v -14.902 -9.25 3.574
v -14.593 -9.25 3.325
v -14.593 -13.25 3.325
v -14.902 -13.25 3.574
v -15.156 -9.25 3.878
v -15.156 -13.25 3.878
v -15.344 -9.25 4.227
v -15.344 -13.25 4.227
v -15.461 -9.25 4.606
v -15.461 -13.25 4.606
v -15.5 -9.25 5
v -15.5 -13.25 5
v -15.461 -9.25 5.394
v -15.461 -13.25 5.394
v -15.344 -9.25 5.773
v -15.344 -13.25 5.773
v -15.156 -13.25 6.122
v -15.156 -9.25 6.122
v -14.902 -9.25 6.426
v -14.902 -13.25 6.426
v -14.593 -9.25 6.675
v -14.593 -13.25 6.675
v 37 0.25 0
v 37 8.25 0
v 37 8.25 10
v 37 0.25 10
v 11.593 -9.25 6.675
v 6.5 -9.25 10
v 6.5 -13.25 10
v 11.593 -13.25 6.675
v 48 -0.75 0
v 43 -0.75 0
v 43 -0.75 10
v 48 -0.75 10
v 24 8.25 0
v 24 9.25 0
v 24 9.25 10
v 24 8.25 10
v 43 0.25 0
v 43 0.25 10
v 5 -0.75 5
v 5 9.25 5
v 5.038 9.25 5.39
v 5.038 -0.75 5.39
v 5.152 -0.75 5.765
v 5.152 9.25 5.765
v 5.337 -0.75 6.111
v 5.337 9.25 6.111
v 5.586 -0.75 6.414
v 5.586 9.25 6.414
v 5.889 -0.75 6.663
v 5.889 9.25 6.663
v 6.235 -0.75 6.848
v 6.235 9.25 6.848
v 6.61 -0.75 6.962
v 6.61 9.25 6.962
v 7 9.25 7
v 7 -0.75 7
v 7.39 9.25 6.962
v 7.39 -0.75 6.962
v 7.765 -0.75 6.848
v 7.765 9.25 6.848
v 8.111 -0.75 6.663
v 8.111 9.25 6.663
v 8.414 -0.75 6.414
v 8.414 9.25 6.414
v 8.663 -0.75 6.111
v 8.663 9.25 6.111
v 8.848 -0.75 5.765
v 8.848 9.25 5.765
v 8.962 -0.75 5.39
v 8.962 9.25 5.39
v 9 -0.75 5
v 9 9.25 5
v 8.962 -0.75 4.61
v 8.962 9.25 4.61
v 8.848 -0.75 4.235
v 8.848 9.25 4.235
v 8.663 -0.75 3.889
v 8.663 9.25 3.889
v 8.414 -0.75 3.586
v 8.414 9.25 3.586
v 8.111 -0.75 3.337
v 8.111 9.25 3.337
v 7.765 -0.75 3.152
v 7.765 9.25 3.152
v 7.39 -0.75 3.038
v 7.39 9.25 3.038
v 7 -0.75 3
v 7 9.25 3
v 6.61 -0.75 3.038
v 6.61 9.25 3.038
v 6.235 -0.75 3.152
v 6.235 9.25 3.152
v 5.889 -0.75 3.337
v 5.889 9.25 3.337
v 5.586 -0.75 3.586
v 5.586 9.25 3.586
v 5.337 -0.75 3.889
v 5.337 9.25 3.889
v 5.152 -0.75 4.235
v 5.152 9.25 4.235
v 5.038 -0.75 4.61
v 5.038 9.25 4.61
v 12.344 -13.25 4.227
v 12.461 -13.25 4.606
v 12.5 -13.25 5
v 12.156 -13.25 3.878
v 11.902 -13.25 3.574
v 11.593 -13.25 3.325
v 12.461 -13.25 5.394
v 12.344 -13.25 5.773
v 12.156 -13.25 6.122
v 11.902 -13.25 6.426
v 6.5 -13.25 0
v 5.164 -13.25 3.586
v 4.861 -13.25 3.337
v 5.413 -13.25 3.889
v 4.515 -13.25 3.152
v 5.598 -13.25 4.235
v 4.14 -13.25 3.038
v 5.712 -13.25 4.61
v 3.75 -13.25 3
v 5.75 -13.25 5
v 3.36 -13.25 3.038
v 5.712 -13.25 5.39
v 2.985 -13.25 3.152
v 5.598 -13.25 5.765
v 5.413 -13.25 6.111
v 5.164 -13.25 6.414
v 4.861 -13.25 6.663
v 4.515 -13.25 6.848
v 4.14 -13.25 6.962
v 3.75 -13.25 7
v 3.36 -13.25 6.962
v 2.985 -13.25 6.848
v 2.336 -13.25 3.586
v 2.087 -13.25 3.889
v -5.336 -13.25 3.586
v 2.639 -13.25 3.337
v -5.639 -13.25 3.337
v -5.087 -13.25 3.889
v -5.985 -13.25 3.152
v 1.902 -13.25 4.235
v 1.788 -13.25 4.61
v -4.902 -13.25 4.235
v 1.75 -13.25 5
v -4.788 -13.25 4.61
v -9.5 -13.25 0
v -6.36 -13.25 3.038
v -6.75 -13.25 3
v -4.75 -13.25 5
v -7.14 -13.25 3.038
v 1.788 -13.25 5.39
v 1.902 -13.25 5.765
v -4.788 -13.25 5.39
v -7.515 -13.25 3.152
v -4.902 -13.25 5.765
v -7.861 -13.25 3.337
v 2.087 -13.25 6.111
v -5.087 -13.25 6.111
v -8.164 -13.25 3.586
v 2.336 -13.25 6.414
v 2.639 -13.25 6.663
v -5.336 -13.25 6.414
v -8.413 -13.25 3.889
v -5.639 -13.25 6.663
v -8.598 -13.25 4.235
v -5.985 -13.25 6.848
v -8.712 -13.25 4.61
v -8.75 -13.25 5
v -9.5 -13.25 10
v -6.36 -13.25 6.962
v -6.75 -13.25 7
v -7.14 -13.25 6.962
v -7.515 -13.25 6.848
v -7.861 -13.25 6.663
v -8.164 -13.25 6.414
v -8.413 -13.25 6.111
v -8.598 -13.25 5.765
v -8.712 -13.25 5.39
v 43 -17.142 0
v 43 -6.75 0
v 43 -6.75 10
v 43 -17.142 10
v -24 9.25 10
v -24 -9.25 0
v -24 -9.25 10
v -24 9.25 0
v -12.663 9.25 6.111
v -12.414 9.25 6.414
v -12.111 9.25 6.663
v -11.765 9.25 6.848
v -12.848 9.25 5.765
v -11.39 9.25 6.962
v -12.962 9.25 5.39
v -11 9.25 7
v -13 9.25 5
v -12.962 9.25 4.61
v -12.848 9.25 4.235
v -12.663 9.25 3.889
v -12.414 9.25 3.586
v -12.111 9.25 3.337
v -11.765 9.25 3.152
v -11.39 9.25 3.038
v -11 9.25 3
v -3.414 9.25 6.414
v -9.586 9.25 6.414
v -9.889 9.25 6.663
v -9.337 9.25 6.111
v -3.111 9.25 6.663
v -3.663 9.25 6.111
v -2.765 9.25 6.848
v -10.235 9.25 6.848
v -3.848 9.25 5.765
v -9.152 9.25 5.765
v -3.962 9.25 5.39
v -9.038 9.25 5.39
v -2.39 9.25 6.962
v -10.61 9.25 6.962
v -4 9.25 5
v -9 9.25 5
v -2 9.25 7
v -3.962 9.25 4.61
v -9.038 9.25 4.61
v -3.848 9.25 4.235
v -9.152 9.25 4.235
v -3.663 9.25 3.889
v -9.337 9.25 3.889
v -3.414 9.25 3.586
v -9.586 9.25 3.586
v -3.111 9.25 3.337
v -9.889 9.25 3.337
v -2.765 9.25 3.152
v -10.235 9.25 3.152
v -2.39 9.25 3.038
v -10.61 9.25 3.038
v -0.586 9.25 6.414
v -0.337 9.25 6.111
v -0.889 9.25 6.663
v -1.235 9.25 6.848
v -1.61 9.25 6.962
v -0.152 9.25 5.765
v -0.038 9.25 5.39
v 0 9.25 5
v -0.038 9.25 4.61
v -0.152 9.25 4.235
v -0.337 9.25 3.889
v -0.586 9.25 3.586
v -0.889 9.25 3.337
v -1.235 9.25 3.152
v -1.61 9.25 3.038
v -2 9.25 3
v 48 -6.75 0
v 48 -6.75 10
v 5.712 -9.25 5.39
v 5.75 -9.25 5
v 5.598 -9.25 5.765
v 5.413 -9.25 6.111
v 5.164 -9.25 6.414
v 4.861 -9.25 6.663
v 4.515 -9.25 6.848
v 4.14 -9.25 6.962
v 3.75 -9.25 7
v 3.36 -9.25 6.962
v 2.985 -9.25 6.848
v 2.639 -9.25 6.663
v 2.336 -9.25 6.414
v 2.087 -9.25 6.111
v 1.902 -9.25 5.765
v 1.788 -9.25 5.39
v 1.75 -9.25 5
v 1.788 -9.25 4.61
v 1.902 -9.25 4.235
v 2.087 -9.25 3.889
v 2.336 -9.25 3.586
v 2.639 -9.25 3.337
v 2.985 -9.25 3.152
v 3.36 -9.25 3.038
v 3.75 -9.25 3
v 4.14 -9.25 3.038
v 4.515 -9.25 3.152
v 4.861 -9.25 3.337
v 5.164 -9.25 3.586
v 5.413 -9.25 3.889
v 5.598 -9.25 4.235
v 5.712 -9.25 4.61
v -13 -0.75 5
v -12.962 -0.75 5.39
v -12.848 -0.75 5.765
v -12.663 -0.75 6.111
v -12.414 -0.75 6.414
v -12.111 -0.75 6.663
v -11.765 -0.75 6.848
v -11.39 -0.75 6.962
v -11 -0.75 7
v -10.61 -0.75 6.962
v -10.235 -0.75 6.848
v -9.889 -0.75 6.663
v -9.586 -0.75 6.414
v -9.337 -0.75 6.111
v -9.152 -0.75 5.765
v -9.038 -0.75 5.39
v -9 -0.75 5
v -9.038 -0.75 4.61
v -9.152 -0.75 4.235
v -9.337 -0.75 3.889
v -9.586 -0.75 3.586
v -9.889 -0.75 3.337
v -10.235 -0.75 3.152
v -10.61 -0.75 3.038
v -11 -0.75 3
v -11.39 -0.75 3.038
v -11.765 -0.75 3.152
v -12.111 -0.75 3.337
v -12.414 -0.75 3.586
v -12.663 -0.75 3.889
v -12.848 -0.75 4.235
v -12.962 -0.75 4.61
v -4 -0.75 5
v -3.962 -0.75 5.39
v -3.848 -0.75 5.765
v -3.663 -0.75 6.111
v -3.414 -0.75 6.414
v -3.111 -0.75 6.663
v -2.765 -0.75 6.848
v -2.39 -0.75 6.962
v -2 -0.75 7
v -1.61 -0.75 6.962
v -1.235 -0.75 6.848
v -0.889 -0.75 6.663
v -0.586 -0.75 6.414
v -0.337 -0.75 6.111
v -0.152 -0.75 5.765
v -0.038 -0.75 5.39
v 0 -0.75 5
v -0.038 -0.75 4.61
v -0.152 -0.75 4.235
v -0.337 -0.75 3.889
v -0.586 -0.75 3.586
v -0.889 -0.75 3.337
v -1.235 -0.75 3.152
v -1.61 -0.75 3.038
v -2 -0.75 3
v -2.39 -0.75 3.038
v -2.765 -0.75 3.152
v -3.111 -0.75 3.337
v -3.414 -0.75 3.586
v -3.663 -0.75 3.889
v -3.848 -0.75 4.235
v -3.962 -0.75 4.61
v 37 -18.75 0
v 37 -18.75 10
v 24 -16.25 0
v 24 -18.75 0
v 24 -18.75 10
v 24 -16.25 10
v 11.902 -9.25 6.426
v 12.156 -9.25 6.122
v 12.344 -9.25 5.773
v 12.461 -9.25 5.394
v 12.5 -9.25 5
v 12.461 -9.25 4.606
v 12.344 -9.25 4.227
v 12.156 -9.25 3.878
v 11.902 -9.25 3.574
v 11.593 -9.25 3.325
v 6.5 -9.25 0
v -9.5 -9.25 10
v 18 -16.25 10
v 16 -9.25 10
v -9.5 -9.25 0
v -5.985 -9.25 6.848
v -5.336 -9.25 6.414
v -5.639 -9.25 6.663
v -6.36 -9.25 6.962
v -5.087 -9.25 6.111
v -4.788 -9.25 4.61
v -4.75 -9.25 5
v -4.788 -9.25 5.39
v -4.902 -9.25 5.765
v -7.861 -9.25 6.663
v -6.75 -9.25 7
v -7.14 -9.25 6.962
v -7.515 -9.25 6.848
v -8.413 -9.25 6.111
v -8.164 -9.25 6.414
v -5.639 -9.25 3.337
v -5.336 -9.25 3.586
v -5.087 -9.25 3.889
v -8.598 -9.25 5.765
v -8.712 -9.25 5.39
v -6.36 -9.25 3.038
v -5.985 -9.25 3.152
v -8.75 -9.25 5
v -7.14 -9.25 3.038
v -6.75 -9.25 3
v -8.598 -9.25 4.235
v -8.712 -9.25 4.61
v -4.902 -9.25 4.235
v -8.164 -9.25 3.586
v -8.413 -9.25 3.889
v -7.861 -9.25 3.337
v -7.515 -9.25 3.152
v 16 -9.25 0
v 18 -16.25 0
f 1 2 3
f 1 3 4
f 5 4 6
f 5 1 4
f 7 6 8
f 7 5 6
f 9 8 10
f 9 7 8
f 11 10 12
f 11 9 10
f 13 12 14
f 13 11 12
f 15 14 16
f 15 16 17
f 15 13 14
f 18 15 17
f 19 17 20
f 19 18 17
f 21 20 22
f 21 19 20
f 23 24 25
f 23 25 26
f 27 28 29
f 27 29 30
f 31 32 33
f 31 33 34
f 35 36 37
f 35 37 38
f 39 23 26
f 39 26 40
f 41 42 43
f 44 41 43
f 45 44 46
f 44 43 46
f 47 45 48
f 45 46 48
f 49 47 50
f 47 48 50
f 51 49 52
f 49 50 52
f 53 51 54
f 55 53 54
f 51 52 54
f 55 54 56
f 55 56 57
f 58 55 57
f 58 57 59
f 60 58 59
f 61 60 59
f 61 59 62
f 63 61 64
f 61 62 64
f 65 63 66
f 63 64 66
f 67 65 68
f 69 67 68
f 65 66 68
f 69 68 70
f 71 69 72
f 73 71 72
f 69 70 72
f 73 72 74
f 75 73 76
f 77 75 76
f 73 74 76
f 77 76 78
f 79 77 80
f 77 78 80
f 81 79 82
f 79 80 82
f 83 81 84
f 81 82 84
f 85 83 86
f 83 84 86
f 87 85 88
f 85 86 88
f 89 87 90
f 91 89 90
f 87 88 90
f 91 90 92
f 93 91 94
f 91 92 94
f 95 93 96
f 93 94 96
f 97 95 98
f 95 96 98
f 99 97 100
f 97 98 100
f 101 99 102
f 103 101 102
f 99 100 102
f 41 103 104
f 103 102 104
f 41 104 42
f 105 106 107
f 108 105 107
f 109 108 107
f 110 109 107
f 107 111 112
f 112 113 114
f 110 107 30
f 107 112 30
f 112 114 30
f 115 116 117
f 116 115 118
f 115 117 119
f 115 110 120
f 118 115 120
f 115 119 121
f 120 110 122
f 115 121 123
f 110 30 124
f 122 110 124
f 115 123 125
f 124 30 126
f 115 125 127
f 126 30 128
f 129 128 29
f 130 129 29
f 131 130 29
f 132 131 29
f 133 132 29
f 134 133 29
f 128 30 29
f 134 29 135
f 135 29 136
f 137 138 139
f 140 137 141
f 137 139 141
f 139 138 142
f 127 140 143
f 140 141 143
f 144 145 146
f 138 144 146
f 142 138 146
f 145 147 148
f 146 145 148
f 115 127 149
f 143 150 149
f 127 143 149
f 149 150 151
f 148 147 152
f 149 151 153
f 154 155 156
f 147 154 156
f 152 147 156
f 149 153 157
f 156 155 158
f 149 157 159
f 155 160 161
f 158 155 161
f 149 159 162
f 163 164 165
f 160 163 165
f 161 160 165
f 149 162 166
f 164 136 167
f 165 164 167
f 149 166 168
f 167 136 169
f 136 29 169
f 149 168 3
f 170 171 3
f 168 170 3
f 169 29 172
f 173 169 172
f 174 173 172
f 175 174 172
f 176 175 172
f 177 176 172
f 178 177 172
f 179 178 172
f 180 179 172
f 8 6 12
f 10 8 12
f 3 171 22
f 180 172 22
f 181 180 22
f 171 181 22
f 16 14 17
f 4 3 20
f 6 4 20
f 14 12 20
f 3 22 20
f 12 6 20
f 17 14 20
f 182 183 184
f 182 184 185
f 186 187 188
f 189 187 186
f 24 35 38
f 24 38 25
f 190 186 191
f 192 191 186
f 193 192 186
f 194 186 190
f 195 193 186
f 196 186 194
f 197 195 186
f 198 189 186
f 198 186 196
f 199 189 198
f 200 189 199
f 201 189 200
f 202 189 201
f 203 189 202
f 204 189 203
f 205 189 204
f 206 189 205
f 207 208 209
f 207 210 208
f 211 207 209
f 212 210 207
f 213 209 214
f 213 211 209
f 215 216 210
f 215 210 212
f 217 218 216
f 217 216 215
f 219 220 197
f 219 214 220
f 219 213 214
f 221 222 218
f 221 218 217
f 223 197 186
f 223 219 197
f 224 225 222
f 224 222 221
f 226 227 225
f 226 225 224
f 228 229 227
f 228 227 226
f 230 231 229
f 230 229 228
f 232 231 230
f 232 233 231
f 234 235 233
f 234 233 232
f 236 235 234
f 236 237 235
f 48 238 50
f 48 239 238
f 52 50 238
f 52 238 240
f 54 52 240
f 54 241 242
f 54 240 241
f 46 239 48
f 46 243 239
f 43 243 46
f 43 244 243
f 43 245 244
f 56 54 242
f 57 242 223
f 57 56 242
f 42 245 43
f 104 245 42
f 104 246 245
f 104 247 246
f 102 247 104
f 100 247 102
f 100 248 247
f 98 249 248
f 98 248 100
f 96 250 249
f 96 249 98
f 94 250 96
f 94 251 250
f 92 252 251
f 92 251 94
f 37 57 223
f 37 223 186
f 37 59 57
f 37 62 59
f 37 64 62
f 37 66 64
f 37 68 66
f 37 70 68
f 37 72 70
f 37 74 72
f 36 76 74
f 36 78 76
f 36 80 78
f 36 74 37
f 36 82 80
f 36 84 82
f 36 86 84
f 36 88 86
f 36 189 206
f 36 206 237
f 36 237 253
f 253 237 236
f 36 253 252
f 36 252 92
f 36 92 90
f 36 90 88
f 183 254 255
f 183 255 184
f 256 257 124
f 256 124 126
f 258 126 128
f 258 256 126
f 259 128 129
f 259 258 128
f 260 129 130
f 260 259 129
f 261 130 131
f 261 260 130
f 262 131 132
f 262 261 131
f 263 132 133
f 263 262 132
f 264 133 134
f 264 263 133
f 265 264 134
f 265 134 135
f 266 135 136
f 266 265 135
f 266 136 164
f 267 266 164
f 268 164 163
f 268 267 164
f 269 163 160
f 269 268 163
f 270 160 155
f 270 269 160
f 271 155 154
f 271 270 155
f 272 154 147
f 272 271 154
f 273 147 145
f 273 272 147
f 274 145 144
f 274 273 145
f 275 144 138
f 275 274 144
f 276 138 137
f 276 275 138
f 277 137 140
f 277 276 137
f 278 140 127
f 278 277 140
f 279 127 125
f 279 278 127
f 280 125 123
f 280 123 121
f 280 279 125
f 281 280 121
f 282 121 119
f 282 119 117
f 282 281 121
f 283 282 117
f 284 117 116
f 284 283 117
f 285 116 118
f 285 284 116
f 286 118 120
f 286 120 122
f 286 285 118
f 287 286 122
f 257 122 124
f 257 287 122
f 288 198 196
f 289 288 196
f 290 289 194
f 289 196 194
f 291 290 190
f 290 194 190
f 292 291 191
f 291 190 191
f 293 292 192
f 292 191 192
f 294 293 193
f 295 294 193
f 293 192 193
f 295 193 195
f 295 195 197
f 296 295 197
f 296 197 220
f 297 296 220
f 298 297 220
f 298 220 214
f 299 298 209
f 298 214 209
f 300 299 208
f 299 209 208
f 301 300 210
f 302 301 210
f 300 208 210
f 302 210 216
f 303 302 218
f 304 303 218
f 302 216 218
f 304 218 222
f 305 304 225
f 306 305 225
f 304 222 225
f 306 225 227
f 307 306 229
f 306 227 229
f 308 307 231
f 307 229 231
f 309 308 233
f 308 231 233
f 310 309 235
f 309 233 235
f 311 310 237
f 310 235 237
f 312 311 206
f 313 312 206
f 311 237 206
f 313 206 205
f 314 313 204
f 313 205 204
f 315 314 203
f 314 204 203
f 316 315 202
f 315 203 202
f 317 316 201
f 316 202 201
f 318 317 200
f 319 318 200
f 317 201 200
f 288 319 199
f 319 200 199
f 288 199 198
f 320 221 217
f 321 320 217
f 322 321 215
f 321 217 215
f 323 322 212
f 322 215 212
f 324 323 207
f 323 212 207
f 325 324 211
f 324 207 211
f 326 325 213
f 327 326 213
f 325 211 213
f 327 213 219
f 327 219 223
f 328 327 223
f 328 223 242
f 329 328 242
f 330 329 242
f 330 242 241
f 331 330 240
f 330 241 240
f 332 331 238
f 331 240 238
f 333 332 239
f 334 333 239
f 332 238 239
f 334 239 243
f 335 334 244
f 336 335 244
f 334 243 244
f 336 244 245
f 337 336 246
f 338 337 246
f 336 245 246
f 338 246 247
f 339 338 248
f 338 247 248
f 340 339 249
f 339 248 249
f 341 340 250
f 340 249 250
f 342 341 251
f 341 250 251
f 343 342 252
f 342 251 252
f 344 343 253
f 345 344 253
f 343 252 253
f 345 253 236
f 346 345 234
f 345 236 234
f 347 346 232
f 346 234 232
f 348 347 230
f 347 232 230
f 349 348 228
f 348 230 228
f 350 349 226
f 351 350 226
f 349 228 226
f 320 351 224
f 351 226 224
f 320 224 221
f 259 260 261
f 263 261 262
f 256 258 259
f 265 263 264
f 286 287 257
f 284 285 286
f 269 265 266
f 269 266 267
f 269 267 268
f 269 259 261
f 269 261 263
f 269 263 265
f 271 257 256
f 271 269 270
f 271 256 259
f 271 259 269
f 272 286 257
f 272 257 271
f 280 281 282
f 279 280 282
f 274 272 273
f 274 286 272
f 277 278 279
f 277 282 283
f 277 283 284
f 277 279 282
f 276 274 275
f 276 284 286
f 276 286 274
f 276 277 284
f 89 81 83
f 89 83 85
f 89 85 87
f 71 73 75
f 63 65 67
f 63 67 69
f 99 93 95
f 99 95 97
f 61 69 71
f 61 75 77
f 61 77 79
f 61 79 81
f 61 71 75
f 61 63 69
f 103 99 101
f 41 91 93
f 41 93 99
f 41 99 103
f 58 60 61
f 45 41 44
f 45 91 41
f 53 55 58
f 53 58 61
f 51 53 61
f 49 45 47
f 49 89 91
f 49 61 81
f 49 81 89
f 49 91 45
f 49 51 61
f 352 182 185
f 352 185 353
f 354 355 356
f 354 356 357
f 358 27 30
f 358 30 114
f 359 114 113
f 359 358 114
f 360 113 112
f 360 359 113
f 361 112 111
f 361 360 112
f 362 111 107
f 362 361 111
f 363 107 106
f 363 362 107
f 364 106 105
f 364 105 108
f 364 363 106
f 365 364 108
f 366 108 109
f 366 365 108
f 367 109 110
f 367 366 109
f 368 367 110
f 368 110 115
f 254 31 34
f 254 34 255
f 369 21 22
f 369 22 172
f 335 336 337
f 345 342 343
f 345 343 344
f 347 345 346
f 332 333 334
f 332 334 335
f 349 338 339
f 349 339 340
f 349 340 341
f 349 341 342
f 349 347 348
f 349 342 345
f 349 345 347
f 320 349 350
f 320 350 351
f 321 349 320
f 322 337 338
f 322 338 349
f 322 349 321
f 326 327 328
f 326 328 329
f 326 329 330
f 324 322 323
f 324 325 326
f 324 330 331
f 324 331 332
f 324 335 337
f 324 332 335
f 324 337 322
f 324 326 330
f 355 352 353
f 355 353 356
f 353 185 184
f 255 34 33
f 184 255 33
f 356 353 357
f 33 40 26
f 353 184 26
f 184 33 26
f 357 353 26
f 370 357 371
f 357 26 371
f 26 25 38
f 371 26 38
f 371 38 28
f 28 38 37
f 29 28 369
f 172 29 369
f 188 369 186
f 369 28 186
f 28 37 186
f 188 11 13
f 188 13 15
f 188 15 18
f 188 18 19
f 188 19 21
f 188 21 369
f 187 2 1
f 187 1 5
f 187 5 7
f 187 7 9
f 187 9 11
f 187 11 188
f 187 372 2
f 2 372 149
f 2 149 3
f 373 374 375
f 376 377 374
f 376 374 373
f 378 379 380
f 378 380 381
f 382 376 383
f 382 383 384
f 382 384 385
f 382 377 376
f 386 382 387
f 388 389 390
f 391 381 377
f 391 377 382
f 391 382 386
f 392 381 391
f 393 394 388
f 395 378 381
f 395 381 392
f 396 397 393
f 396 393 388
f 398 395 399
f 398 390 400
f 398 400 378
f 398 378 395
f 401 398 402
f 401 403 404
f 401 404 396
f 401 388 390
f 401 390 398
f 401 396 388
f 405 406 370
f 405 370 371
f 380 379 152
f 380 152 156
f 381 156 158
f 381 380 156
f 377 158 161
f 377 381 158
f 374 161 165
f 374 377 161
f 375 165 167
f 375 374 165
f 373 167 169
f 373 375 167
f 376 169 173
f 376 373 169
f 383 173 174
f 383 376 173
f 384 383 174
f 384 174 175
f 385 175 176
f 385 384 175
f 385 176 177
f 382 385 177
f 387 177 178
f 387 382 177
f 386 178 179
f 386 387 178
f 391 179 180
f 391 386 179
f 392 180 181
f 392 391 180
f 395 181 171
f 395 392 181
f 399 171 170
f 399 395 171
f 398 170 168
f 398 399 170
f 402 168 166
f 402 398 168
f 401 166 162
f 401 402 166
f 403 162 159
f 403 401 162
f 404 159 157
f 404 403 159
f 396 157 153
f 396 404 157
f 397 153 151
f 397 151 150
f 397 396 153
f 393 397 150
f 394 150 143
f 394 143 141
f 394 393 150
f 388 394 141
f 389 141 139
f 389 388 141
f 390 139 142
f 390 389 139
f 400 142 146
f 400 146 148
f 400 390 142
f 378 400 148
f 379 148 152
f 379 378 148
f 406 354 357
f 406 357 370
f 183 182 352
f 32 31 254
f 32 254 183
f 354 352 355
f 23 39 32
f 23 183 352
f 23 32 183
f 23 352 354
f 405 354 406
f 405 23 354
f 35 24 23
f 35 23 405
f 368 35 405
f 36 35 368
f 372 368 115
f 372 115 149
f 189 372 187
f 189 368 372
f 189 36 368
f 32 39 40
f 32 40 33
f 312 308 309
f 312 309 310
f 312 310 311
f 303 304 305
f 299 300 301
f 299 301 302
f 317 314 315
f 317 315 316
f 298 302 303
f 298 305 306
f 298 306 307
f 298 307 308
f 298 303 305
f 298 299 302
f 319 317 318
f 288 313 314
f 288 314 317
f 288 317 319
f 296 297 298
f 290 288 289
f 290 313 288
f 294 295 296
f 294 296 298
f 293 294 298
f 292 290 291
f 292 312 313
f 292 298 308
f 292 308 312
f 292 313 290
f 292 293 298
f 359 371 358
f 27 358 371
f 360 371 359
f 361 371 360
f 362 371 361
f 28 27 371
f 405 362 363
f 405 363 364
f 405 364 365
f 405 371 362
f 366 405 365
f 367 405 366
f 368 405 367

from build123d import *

# Parameters (mm, degrees)
EXTRUDE_1_DEPTH     = 10
SKETCH_2_R          = 2
EXTRUDE_2_DEPTH     = 4
SKETCH_3_R          = 2
CUT_EXTRUDE_1_DEPTH = 10


with BuildPart() as part:
    # 草图1 → 凸台-拉伸1 (new body)
    with BuildSketch(Plane.XY):
        Polygon((18, -16.25), (16, -9.25), (-24, -9.25), (-24, 9.25), (24, 9.25), (24, 8.25), (37, 8.25), (37, 0.25), (43, 0.25), (43, -0.75), (48, -0.75), (48, -6.75), (43, -6.75), (43, -17.142304845), (37, -18.75), (24, -18.75), (24, -16.25), align=None)
    extrude(amount=EXTRUDE_1_DEPTH)

    # 草图2 → 凸台-拉伸2 (add)
    with BuildSketch(Plane.XZ.offset(9.25)):
        with BuildLine():
            Line((-14.593356715, 6.674685372), (-9.5, 10))
            Line((-9.5, 10), (6.5, 10))
            Line((6.5, 10), (11.593356715, 6.674685372))
            ThreePointArc((11.593356715, 6.674685372), (12.5, 5), (11.593356715, 3.325314628))
            Line((11.593356715, 3.325314628), (6.5, 0))
            Line((6.5, 0), (-9.5, 0))
            Line((-9.5, 0), (-14.593356715, 3.325314628))
            ThreePointArc((-14.593356715, 3.325314628), (-15.5, 5), (-14.593356715, 6.674685372))
        make_face()
        with Locations((-6.75, 5)):
            Circle(SKETCH_2_R, mode=Mode.SUBTRACT)
        with Locations((3.75, 5)):
            Circle(SKETCH_2_R, mode=Mode.SUBTRACT)
    extrude(amount=EXTRUDE_2_DEPTH)

    # 草图3 → 切除-拉伸1 (cut)
    with BuildSketch(Plane(origin=(0, 9.25, 0), x_dir=(1, 0, 0), z_dir=(0, 1, 0))):
        with Locations(Location((-2, -5, 0), (0, 0, 180))):
            Circle(SKETCH_3_R)
        with Locations(Location((-11, -5, 0), (0, 0, 180))):
            Circle(SKETCH_3_R)
        with Locations(Location((7, -5, 0), (0, 0, 180))):
            Circle(SKETCH_3_R)
    extrude(amount=-CUT_EXTRUDE_1_DEPTH, mode=Mode.SUBTRACT)


solid = part.part
